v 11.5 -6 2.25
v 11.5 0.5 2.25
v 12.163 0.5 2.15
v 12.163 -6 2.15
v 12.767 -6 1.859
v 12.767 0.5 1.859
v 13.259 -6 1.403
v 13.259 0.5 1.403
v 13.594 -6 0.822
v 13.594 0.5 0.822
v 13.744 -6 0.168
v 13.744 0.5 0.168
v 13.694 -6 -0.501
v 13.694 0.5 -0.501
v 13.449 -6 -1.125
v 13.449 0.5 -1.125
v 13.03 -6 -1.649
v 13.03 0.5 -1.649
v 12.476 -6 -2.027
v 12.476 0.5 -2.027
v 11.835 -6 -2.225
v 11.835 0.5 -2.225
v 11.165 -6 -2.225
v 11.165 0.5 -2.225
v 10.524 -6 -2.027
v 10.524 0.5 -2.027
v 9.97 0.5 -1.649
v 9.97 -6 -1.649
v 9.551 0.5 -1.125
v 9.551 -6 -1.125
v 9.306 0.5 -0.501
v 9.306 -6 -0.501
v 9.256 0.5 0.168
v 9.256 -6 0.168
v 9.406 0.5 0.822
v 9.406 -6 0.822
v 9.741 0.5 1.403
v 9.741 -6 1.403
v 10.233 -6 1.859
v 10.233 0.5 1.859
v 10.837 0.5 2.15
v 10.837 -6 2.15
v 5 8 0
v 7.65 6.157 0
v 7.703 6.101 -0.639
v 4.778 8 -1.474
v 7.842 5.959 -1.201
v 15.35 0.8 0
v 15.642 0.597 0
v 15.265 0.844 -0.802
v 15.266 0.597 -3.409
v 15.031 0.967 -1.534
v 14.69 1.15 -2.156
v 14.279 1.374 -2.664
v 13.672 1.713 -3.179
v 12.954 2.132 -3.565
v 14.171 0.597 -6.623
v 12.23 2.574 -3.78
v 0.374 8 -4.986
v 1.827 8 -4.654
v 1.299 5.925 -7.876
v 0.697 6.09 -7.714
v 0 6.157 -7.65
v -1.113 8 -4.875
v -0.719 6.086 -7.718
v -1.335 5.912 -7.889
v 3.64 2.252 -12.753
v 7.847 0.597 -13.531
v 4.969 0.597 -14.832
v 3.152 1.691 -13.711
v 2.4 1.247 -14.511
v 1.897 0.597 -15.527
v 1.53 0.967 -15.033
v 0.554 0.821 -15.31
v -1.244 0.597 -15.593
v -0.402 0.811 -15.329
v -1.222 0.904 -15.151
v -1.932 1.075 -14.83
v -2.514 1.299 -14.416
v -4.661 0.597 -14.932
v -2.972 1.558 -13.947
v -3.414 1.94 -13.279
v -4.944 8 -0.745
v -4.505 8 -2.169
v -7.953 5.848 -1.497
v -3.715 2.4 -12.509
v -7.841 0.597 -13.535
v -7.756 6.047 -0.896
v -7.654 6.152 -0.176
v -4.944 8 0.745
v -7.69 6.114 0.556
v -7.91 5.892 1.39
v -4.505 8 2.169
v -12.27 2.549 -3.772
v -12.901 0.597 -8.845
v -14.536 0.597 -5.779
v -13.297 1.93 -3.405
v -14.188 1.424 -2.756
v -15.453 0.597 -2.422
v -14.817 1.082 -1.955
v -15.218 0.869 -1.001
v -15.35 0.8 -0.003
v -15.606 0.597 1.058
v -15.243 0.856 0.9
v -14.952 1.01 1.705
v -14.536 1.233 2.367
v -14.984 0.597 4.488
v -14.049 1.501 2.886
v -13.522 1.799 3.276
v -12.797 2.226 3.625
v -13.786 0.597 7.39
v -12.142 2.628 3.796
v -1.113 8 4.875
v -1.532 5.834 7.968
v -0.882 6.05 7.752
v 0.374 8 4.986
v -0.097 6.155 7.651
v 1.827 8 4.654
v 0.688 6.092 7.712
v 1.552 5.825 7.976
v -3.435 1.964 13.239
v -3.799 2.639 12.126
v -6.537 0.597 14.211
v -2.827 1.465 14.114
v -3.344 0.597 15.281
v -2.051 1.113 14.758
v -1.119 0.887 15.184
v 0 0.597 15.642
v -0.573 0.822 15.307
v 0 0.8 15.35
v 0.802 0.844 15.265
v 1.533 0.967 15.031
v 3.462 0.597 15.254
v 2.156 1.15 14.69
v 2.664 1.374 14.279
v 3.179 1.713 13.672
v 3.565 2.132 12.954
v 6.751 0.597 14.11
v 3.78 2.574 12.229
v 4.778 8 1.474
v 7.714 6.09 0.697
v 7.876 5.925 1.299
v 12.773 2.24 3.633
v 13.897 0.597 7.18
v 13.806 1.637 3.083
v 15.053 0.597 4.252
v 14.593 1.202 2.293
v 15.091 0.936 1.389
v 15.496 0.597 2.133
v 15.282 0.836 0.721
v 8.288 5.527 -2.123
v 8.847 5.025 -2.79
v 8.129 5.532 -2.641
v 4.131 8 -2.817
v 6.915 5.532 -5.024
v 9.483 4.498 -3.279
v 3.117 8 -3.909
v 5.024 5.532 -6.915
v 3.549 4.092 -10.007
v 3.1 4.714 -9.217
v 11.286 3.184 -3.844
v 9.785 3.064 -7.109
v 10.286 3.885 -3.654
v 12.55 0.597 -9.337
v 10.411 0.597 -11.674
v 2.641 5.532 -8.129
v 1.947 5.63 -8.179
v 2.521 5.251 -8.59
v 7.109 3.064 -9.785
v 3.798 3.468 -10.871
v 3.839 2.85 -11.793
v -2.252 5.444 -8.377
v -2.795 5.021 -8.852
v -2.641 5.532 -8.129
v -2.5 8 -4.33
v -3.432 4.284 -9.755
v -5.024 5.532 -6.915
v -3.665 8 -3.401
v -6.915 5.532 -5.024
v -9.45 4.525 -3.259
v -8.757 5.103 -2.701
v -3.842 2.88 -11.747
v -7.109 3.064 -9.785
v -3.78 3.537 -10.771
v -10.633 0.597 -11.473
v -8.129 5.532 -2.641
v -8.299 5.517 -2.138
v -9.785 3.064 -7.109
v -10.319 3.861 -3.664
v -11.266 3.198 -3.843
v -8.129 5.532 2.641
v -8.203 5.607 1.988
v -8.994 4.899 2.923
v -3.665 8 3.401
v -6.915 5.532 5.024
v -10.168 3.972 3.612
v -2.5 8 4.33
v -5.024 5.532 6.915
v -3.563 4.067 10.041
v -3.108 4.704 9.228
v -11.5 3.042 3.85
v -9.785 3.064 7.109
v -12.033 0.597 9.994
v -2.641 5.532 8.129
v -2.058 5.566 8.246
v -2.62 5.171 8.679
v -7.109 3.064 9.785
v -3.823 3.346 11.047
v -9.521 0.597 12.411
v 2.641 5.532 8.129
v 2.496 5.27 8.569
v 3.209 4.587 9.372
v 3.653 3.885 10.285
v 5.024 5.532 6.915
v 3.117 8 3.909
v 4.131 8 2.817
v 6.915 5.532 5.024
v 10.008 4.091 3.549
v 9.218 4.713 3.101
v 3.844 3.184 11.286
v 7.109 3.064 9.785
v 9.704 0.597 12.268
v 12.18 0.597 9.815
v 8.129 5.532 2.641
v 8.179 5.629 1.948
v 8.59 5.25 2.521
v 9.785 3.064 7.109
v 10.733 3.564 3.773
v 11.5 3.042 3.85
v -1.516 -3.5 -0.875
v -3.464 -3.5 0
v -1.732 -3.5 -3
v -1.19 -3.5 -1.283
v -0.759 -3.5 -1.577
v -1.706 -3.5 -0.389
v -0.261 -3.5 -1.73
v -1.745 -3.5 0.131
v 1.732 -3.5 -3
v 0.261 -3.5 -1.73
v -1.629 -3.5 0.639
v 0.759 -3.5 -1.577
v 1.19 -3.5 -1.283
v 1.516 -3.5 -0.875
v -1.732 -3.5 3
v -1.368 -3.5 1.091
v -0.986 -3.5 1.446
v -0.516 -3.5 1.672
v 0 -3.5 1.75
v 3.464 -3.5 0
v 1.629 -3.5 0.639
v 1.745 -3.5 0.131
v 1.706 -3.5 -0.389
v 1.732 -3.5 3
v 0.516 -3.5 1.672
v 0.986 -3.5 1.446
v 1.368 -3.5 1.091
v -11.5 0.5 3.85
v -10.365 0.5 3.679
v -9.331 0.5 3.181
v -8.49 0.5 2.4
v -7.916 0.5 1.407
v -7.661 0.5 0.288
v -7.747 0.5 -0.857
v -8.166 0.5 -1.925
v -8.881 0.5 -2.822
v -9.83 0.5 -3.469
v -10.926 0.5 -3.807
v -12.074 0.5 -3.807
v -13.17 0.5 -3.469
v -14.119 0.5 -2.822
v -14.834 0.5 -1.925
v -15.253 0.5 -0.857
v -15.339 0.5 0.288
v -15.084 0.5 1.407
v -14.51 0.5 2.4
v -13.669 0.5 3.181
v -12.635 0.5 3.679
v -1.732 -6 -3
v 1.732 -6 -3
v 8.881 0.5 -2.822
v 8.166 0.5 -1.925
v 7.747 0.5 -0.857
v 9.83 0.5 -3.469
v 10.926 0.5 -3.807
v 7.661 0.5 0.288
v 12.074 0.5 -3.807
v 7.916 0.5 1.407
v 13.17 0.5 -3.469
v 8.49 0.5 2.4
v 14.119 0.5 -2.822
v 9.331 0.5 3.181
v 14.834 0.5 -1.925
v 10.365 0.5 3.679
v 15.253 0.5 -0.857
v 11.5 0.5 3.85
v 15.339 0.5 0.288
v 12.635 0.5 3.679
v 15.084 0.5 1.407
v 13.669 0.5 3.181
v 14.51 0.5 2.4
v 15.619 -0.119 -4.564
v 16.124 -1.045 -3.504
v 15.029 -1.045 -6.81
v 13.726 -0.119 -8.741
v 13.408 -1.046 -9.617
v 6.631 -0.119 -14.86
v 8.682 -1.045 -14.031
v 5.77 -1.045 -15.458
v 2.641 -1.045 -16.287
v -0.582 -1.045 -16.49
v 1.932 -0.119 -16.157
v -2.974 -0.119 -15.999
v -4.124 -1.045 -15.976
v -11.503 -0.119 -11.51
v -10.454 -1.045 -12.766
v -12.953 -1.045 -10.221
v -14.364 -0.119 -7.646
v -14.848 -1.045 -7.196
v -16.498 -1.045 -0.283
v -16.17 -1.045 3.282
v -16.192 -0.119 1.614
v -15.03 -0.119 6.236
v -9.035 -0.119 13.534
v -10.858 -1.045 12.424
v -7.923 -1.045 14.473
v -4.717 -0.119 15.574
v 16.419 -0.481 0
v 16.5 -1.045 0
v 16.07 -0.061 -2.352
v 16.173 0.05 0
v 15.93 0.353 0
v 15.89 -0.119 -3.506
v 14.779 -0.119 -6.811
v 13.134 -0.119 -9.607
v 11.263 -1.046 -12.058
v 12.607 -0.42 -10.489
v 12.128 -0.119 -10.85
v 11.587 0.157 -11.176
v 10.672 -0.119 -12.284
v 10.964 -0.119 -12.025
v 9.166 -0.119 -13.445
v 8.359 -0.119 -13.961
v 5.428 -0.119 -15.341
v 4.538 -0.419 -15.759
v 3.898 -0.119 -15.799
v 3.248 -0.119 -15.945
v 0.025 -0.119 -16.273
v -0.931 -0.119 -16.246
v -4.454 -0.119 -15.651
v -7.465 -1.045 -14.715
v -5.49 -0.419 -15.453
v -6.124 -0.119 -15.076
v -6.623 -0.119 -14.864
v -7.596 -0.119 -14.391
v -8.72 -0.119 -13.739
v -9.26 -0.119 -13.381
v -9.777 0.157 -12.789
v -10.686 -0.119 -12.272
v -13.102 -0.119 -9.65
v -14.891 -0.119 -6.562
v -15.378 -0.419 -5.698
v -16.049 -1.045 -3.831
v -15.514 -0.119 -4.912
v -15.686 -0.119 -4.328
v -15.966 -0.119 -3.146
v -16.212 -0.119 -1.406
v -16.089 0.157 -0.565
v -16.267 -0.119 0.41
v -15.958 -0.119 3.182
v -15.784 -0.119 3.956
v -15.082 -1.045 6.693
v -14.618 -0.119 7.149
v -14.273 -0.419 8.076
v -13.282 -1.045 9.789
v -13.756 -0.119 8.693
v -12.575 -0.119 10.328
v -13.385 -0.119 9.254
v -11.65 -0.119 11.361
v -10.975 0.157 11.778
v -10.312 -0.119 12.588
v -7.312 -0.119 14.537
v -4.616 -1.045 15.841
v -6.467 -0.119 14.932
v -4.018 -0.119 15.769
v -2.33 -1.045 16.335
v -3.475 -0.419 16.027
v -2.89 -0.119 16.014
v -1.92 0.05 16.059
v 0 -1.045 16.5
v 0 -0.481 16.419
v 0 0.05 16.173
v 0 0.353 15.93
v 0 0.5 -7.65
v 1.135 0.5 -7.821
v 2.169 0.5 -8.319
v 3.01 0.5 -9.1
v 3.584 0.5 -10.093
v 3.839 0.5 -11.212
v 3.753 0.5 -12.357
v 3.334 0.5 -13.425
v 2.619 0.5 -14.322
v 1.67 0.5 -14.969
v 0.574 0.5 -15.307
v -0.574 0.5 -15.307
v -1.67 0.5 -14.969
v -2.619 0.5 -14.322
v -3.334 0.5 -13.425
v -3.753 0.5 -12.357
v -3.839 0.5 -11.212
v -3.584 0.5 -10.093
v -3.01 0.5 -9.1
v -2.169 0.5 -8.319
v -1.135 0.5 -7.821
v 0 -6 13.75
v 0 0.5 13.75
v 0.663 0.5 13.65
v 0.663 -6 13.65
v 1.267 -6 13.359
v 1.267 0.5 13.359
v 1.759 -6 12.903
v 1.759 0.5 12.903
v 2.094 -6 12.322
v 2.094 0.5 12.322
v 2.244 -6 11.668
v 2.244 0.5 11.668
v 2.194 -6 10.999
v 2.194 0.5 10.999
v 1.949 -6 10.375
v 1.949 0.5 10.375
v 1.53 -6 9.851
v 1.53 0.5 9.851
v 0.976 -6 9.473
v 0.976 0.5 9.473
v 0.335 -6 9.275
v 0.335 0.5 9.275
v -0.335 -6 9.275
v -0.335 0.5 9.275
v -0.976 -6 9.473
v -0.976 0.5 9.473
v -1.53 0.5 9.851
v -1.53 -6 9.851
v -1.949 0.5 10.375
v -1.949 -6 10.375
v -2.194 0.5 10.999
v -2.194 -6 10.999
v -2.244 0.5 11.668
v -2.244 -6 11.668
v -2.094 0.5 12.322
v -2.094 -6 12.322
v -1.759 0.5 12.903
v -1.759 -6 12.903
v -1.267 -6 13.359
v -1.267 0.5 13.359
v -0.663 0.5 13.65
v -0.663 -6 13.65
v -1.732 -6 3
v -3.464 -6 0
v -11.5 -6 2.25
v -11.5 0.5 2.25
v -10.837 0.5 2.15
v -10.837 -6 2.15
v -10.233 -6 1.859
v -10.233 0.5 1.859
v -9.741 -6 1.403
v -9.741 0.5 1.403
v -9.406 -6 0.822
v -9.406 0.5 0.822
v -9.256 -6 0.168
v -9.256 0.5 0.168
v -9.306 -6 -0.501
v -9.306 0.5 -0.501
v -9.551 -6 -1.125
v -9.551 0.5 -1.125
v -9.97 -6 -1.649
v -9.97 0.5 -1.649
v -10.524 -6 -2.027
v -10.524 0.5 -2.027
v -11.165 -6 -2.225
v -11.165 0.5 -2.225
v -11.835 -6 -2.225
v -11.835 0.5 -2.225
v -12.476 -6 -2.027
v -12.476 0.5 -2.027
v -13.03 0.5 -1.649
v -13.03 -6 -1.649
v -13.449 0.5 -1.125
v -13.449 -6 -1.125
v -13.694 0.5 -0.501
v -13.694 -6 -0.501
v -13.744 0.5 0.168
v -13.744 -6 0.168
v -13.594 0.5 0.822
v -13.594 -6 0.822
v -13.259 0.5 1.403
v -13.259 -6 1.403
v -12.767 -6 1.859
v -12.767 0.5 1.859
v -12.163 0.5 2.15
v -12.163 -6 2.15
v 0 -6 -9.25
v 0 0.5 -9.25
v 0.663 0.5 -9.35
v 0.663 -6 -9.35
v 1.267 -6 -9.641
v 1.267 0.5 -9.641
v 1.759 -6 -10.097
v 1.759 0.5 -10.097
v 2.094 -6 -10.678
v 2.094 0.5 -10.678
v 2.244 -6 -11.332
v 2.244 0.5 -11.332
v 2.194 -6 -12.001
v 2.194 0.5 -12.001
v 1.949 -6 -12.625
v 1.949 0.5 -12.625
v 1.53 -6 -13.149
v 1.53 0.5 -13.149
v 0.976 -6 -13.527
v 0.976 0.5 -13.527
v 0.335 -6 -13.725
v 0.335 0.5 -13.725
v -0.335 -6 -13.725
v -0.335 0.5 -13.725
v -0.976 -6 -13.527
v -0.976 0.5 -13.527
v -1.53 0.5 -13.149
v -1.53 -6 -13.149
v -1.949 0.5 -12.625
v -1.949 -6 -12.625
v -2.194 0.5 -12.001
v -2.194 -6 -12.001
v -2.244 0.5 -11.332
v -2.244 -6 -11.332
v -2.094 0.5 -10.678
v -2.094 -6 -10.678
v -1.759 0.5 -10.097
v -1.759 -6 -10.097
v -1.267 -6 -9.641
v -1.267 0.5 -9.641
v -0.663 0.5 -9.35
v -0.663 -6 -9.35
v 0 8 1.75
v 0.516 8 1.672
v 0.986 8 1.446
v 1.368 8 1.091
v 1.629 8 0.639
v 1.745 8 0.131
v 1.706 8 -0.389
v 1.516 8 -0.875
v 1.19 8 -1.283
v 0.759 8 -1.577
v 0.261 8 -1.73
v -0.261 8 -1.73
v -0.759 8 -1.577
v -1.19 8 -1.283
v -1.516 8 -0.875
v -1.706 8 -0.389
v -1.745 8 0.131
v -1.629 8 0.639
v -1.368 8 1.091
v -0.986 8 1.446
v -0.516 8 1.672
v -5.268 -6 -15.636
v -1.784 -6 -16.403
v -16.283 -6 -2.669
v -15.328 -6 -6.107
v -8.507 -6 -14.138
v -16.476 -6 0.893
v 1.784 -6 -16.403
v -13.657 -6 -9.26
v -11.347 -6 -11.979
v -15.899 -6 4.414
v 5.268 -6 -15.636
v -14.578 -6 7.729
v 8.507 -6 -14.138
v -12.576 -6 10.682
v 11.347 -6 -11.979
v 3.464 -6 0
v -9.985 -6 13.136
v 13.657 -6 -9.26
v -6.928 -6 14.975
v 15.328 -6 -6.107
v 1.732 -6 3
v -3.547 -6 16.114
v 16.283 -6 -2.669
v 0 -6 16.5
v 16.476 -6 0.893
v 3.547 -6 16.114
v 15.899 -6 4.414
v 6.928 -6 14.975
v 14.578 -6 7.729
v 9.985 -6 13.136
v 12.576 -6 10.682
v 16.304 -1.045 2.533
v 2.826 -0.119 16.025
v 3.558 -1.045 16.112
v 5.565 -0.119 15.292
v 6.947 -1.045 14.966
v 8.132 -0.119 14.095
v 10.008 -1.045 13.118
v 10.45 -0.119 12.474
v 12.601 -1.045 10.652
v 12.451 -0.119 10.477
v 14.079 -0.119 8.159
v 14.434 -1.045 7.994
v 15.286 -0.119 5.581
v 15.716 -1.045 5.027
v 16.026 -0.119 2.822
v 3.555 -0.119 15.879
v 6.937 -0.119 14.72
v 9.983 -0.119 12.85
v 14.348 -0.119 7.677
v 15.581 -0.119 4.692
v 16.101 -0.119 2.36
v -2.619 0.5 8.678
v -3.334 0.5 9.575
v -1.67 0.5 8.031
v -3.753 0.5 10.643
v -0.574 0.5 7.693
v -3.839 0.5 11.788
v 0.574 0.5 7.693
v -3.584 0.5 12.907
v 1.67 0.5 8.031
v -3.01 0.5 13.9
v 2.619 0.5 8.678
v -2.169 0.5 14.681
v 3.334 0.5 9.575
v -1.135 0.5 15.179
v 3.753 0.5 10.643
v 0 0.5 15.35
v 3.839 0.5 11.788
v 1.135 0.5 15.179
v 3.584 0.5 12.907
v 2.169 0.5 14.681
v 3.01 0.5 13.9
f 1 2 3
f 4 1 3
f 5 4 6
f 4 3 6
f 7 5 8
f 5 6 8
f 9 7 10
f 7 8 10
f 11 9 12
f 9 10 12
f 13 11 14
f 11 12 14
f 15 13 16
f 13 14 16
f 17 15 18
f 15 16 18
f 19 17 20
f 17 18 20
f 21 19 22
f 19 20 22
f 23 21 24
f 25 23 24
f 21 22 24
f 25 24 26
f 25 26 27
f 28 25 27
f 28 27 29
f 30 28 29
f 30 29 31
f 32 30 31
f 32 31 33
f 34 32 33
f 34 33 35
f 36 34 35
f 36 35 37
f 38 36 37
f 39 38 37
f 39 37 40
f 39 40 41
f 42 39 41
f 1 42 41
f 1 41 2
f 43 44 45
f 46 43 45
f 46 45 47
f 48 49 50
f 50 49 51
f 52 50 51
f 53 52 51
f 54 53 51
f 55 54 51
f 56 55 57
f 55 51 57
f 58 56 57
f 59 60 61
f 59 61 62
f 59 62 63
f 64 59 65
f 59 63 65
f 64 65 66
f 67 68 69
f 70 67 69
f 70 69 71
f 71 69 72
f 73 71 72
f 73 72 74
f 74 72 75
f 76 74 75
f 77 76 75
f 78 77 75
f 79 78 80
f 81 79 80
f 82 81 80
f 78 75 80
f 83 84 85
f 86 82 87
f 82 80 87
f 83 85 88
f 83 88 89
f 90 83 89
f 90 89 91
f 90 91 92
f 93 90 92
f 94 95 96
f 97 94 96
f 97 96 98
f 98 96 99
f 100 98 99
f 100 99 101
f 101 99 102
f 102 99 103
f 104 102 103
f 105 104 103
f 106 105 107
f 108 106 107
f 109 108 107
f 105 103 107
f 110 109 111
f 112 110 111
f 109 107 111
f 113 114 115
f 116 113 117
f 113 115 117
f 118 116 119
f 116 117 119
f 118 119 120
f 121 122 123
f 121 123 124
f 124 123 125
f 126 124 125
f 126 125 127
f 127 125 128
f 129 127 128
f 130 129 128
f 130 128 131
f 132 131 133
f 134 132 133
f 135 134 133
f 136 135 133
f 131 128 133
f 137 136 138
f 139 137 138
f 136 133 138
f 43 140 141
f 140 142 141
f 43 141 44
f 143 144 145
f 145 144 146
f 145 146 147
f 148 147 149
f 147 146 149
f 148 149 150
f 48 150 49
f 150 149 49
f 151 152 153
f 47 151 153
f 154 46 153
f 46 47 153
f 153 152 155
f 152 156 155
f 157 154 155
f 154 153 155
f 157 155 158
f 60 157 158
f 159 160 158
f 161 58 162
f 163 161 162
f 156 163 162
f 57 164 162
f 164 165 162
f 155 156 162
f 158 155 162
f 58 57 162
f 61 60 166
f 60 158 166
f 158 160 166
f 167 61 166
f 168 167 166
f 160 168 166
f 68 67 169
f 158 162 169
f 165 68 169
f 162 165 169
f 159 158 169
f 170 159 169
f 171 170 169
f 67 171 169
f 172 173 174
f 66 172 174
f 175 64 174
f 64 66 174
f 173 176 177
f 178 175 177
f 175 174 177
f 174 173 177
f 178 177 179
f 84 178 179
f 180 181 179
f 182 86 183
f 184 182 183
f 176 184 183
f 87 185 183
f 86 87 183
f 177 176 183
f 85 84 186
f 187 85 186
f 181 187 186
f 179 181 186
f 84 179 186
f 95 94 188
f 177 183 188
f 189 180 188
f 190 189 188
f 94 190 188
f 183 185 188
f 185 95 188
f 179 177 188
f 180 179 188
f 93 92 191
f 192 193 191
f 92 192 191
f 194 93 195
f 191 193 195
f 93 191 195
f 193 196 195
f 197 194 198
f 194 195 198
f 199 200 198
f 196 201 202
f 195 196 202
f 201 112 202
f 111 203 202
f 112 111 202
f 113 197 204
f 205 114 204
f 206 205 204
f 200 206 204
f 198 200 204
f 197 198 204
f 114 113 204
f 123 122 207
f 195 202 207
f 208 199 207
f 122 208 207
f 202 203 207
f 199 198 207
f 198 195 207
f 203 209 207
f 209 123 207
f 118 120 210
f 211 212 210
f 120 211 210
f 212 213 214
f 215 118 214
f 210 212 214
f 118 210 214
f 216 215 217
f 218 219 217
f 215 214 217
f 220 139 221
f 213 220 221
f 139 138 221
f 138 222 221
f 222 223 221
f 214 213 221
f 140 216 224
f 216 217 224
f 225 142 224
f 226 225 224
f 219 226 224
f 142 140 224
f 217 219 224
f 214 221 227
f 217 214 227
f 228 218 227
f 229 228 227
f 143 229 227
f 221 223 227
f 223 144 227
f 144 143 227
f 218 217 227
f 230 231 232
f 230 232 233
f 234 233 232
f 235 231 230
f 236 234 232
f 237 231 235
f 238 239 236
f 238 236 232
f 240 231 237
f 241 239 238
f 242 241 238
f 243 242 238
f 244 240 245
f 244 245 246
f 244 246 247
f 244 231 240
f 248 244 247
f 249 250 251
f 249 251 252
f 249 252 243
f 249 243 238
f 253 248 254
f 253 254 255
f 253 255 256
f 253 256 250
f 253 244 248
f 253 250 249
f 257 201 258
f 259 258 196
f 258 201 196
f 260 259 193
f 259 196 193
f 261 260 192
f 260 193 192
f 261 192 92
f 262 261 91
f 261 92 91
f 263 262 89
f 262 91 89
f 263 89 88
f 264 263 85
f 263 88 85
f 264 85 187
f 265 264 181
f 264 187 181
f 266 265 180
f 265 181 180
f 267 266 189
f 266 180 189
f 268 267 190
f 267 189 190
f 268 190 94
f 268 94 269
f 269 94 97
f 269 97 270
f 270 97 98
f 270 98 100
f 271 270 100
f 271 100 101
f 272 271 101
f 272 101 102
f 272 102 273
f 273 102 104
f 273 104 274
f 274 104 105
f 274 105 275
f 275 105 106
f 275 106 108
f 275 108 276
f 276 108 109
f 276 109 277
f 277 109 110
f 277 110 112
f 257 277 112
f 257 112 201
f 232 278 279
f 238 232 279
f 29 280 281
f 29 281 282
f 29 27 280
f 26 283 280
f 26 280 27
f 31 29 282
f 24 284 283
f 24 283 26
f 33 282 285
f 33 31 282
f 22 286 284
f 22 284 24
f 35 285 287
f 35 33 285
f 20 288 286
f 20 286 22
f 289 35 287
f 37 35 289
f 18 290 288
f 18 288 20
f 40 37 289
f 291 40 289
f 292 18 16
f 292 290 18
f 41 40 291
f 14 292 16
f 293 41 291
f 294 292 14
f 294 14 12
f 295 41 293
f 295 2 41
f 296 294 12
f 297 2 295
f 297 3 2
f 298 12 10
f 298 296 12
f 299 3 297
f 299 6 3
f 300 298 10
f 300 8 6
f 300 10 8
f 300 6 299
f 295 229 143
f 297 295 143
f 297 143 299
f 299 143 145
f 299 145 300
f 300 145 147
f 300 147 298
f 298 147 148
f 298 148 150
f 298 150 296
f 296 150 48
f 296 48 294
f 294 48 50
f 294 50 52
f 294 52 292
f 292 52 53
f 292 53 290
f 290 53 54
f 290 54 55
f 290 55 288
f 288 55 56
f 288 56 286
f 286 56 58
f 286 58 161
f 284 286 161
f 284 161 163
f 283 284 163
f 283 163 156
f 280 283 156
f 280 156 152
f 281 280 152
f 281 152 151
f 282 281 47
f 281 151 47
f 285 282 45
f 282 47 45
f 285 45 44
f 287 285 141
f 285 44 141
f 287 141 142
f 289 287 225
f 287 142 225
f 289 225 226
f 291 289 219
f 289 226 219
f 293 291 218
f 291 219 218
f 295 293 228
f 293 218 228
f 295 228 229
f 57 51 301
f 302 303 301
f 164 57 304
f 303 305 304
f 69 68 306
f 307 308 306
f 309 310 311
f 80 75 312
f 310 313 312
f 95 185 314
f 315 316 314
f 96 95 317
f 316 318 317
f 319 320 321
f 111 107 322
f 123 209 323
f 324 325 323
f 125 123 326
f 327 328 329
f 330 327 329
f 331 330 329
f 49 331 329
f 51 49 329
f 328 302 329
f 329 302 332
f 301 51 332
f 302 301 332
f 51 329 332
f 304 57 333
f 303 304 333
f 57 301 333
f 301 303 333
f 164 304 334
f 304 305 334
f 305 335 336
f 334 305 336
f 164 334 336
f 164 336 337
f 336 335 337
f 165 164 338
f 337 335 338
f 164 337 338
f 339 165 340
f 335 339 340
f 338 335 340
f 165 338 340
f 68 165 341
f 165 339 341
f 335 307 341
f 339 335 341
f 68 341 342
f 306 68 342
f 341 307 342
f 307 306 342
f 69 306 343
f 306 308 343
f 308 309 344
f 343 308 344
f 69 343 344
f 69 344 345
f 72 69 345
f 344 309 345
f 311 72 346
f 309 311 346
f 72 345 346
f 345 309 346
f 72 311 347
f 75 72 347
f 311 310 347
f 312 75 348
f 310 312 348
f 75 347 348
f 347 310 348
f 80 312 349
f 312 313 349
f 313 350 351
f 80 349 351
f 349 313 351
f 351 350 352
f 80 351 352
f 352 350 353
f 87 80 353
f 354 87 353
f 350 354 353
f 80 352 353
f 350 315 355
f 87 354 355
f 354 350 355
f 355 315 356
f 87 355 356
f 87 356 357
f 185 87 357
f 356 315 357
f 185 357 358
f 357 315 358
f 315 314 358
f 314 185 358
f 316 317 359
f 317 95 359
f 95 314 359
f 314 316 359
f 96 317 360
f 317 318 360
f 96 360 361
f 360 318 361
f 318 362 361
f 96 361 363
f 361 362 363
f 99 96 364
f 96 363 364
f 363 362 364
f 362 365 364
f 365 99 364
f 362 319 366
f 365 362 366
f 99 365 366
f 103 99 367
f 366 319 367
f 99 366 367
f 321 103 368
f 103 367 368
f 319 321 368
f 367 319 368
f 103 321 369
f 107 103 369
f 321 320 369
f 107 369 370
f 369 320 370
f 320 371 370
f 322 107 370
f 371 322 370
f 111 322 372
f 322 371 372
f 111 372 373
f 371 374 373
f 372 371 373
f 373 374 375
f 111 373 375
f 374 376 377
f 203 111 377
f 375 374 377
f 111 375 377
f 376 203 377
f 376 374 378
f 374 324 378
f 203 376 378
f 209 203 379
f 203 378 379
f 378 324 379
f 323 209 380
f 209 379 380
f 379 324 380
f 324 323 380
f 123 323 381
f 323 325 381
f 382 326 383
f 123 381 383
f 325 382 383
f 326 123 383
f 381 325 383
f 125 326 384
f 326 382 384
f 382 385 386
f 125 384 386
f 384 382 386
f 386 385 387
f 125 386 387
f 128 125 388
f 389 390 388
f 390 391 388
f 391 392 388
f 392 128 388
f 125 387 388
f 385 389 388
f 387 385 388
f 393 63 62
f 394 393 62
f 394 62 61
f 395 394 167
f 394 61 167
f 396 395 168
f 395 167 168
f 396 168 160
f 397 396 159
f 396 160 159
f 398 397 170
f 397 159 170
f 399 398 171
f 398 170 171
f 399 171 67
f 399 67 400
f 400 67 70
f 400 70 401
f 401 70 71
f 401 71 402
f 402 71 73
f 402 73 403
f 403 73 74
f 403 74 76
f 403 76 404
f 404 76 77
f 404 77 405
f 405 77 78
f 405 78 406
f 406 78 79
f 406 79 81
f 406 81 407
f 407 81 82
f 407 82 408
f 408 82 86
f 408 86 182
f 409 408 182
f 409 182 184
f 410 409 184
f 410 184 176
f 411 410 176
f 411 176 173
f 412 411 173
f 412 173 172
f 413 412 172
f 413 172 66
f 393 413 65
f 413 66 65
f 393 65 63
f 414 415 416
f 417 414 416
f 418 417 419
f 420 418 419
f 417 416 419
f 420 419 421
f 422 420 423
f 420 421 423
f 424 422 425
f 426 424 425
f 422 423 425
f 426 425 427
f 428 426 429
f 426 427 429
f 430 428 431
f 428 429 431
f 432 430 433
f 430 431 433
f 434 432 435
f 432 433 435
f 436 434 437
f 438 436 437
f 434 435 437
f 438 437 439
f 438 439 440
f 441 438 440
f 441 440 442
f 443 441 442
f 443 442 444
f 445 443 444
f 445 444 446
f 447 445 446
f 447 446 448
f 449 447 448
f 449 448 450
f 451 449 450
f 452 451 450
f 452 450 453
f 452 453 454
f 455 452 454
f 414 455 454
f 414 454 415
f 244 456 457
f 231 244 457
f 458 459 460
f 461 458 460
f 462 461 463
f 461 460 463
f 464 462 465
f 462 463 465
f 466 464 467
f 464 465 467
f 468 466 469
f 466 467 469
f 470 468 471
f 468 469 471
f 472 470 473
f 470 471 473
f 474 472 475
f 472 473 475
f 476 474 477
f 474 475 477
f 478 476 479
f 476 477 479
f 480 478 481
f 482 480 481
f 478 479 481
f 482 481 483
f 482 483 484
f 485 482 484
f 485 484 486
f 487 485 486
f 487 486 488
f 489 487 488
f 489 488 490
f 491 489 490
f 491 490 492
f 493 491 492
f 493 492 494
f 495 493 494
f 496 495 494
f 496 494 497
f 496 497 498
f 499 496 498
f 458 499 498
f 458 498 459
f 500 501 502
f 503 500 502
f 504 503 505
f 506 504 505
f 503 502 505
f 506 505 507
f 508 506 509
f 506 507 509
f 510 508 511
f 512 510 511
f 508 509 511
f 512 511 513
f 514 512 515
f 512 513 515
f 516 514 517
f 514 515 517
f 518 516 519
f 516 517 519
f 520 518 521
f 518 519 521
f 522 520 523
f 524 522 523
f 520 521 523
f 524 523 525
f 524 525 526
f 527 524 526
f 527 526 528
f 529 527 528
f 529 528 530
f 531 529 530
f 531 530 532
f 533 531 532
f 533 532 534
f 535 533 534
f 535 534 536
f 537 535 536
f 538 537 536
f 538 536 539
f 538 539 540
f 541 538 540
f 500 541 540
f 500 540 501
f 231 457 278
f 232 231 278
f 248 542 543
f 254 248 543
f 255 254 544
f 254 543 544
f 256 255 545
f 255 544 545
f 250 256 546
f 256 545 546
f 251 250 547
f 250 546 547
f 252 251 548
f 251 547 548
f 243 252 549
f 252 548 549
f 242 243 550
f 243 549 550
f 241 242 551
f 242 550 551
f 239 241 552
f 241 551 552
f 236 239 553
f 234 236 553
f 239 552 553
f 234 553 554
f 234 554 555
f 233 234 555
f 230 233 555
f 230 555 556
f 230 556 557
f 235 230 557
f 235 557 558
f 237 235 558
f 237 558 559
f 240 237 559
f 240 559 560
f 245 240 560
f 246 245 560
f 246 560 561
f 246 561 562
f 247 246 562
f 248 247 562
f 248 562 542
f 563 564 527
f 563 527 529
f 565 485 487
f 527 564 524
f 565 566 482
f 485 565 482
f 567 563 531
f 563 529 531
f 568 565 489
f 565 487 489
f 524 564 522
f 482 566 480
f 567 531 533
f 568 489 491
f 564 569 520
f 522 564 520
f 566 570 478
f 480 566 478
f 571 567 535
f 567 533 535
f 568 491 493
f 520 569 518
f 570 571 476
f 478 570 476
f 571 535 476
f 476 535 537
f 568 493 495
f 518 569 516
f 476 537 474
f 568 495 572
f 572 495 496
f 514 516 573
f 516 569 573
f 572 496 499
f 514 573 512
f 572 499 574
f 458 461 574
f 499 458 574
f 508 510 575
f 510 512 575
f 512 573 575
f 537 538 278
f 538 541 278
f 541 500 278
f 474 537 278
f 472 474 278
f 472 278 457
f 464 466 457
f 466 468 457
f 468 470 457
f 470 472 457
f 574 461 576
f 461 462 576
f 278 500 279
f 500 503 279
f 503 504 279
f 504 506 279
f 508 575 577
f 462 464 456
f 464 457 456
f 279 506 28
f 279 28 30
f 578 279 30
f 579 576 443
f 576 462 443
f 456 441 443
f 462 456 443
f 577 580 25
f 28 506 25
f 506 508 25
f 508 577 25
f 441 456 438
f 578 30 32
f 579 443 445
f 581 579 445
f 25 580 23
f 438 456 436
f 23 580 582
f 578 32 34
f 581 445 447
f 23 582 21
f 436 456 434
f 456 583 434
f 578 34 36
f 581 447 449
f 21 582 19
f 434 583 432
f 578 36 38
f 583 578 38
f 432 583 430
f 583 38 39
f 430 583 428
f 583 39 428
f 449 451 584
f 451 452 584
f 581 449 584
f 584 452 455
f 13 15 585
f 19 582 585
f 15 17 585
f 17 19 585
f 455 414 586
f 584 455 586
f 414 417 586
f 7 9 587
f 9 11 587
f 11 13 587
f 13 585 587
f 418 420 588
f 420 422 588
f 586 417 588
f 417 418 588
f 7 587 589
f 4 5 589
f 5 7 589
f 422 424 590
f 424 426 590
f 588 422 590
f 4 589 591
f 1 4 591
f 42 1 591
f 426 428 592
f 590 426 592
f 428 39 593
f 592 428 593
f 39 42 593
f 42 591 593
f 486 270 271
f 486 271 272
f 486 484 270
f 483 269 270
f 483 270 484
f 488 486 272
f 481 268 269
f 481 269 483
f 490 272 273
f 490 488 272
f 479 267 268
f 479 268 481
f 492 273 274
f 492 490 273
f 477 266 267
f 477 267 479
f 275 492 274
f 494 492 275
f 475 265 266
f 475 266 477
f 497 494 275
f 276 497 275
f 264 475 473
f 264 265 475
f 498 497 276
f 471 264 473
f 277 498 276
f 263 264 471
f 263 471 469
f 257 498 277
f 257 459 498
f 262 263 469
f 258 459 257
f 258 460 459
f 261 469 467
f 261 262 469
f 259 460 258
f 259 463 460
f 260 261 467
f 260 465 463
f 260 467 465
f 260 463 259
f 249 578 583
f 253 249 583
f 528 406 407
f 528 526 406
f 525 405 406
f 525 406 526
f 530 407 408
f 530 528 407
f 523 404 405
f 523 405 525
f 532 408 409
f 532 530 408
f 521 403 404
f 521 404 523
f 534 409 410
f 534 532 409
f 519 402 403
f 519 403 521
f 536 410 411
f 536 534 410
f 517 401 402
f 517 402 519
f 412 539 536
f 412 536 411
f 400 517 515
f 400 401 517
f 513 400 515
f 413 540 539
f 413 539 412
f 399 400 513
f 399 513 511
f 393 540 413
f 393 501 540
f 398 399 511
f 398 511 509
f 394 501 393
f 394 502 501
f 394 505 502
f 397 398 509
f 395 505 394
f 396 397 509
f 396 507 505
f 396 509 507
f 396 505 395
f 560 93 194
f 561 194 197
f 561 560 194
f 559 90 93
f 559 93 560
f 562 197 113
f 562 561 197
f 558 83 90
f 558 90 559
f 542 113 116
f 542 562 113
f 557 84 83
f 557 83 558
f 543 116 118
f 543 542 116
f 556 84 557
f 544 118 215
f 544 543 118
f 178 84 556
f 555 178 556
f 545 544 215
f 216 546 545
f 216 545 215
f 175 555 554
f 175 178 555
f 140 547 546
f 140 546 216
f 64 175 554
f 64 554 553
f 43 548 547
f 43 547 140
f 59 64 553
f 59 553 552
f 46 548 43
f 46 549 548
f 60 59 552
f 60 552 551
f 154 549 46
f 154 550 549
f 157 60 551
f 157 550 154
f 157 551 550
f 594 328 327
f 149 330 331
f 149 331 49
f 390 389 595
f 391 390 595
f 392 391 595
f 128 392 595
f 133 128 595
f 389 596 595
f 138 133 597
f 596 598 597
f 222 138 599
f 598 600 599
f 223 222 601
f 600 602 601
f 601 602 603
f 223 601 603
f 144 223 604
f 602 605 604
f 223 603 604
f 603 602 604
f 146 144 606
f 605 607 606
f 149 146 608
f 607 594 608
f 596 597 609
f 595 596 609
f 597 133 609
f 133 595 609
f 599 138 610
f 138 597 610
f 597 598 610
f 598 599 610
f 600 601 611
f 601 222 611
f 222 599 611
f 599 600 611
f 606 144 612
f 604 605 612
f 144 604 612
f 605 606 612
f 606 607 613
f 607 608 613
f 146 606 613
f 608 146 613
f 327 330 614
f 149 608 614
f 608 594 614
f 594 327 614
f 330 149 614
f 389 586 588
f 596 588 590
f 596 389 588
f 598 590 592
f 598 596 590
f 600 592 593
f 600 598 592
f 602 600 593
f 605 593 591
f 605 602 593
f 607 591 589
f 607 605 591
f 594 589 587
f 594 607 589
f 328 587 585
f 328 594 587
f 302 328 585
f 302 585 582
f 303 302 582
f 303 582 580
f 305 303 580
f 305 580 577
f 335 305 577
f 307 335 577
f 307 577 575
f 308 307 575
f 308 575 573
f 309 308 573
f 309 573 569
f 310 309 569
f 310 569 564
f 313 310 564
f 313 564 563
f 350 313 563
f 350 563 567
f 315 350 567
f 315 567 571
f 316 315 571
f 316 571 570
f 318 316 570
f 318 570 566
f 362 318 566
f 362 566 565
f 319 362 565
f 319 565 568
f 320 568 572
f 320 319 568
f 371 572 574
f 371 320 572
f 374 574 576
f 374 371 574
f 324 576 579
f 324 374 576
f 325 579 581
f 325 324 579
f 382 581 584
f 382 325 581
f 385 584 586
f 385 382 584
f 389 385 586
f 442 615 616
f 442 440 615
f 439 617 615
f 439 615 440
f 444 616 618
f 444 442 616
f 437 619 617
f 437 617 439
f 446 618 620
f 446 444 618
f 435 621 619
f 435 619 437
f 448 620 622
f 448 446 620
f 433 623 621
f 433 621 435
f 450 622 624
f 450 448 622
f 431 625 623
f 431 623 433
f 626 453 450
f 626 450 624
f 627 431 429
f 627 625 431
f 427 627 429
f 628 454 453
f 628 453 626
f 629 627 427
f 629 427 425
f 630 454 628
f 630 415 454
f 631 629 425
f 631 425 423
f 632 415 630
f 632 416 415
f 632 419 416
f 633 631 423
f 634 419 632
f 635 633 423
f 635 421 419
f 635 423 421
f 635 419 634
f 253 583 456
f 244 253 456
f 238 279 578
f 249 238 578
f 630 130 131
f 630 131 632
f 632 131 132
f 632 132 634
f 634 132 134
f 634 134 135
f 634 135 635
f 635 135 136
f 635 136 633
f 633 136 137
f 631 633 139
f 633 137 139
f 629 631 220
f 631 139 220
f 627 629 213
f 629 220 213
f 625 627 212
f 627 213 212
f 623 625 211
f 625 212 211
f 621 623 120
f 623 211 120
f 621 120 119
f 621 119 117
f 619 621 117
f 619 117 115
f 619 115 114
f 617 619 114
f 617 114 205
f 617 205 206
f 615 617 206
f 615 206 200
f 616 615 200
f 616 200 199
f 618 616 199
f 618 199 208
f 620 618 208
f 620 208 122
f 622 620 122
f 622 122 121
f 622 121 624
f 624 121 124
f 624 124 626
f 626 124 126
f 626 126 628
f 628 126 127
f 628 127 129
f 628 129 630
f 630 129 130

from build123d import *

# Parameters (mm, degrees)
SKETCH1_R           = 16.5
BOSS_EXTRUDE1_DEPTH = 6
SKETCH4_R           = 5
SKETCH6_R           = 3.85
CUT_EXTRUDE1_DEPTH  = 7.5
SKETCH7_R           = 1.75
CUT_EXTRUDE2_DEPTH  = 28.21212977
SKETCH9_R           = 2.25
CUT_EXTRUDE3_DEPTH  = 25.834452009
FILLET1_R           = 2
CUT_EXTRUDE4_DEPTH  = 2.5


with BuildPart() as part:
    # Sketch1 → Boss-Extrude1 (new body)
    with BuildSketch(Plane(origin=(0, 0, 0), x_dir=(1, 0, 0), z_dir=(0, 1, 0))):
        with Locations(Location((0, 0, 0), (0, 0, 270))):
            Circle(SKETCH1_R)
    extrude(amount=-BOSS_EXTRUDE1_DEPTH)

    # Sketch4 → section 0 of loft1
    with BuildSketch(Plane(origin=(0, 8, 0), x_dir=(1, 0, 0), z_dir=(0, 1, 0)), mode=Mode.PRIVATE) as loft1_s0:
        Circle(SKETCH4_R)
    # loft up to a face of the part (loft1)
    loft([loft1_s0.sketch, part.faces().sort_by_distance((0, 0, 0))[0]])

    # Sketch6 → Cut-Extrude1 (cut)
    with BuildSketch(Plane(origin=(0, 8, 0), x_dir=(1, 0, 0), z_dir=(0, 1, 0))):
        with Locations(Location((0, 11.5, 0), (0, 0, 270))):
            Circle(SKETCH6_R)
        with Locations(Location((11.5, 0, 0), (0, 0, 270))):
            Circle(SKETCH6_R)
        with Locations(Location((0, -11.5, 0), (0, 0, 270))):
            Circle(SKETCH6_R)
        with Locations(Location((-11.5, 0, 0), (0, 0, 270))):
            Circle(SKETCH6_R)
    extrude(amount=-CUT_EXTRUDE1_DEPTH, mode=Mode.SUBTRACT)

    # Sketch7 → Cut-Extrude2 (cut, through all)
    with BuildSketch(Plane(origin=(0, 8, 0), x_dir=(1, 0, 0), z_dir=(0, 1, 0))):
        with Locations(Location((0, 0, 0), (0, 0, 270))):
            Circle(SKETCH7_R)
    extrude(amount=-CUT_EXTRUDE2_DEPTH, mode=Mode.SUBTRACT)

    # Sketch9 → Cut-Extrude3 (cut, through all)
    with BuildSketch(Plane(origin=(0, 2.5, 0), x_dir=(1, 0, 0), z_dir=(0, 1, 0))):
        with Locations(Location((0, 11.5, 0), (0, 0, 270))):
            Circle(SKETCH9_R)
        with Locations(Location((11.5, 0, 0), (0, 0, 270))):
            Circle(SKETCH9_R)
        with Locations(Location((0, -11.5, 0), (0, 0, 270))):
            Circle(SKETCH9_R)
        with Locations(Location((-11.5, 0, 0), (0, 0, 270))):
            Circle(SKETCH9_R)
    extrude(amount=-CUT_EXTRUDE3_DEPTH, mode=Mode.SUBTRACT)

    # Fillet1
    fillet1_edges = [part.edges().sort_by_distance(p)[0] for p in [
        (11.66726189, 0, 11.66726189),
    ]]
    fillet(fillet1_edges, radius=FILLET1_R)

    # Sketch10 → Cut-Extrude4 (cut)
    with BuildSketch(Plane.XZ.offset(6)):
        Polygon((1.732050808, -3), (3.464101615, 0), (1.732050808, 3), (-1.732050808, 3), (-3.464101615, 0), (-1.732050808, -3), align=None)
    extrude(amount=-CUT_EXTRUDE4_DEPTH, mode=Mode.SUBTRACT)


solid = part.part
